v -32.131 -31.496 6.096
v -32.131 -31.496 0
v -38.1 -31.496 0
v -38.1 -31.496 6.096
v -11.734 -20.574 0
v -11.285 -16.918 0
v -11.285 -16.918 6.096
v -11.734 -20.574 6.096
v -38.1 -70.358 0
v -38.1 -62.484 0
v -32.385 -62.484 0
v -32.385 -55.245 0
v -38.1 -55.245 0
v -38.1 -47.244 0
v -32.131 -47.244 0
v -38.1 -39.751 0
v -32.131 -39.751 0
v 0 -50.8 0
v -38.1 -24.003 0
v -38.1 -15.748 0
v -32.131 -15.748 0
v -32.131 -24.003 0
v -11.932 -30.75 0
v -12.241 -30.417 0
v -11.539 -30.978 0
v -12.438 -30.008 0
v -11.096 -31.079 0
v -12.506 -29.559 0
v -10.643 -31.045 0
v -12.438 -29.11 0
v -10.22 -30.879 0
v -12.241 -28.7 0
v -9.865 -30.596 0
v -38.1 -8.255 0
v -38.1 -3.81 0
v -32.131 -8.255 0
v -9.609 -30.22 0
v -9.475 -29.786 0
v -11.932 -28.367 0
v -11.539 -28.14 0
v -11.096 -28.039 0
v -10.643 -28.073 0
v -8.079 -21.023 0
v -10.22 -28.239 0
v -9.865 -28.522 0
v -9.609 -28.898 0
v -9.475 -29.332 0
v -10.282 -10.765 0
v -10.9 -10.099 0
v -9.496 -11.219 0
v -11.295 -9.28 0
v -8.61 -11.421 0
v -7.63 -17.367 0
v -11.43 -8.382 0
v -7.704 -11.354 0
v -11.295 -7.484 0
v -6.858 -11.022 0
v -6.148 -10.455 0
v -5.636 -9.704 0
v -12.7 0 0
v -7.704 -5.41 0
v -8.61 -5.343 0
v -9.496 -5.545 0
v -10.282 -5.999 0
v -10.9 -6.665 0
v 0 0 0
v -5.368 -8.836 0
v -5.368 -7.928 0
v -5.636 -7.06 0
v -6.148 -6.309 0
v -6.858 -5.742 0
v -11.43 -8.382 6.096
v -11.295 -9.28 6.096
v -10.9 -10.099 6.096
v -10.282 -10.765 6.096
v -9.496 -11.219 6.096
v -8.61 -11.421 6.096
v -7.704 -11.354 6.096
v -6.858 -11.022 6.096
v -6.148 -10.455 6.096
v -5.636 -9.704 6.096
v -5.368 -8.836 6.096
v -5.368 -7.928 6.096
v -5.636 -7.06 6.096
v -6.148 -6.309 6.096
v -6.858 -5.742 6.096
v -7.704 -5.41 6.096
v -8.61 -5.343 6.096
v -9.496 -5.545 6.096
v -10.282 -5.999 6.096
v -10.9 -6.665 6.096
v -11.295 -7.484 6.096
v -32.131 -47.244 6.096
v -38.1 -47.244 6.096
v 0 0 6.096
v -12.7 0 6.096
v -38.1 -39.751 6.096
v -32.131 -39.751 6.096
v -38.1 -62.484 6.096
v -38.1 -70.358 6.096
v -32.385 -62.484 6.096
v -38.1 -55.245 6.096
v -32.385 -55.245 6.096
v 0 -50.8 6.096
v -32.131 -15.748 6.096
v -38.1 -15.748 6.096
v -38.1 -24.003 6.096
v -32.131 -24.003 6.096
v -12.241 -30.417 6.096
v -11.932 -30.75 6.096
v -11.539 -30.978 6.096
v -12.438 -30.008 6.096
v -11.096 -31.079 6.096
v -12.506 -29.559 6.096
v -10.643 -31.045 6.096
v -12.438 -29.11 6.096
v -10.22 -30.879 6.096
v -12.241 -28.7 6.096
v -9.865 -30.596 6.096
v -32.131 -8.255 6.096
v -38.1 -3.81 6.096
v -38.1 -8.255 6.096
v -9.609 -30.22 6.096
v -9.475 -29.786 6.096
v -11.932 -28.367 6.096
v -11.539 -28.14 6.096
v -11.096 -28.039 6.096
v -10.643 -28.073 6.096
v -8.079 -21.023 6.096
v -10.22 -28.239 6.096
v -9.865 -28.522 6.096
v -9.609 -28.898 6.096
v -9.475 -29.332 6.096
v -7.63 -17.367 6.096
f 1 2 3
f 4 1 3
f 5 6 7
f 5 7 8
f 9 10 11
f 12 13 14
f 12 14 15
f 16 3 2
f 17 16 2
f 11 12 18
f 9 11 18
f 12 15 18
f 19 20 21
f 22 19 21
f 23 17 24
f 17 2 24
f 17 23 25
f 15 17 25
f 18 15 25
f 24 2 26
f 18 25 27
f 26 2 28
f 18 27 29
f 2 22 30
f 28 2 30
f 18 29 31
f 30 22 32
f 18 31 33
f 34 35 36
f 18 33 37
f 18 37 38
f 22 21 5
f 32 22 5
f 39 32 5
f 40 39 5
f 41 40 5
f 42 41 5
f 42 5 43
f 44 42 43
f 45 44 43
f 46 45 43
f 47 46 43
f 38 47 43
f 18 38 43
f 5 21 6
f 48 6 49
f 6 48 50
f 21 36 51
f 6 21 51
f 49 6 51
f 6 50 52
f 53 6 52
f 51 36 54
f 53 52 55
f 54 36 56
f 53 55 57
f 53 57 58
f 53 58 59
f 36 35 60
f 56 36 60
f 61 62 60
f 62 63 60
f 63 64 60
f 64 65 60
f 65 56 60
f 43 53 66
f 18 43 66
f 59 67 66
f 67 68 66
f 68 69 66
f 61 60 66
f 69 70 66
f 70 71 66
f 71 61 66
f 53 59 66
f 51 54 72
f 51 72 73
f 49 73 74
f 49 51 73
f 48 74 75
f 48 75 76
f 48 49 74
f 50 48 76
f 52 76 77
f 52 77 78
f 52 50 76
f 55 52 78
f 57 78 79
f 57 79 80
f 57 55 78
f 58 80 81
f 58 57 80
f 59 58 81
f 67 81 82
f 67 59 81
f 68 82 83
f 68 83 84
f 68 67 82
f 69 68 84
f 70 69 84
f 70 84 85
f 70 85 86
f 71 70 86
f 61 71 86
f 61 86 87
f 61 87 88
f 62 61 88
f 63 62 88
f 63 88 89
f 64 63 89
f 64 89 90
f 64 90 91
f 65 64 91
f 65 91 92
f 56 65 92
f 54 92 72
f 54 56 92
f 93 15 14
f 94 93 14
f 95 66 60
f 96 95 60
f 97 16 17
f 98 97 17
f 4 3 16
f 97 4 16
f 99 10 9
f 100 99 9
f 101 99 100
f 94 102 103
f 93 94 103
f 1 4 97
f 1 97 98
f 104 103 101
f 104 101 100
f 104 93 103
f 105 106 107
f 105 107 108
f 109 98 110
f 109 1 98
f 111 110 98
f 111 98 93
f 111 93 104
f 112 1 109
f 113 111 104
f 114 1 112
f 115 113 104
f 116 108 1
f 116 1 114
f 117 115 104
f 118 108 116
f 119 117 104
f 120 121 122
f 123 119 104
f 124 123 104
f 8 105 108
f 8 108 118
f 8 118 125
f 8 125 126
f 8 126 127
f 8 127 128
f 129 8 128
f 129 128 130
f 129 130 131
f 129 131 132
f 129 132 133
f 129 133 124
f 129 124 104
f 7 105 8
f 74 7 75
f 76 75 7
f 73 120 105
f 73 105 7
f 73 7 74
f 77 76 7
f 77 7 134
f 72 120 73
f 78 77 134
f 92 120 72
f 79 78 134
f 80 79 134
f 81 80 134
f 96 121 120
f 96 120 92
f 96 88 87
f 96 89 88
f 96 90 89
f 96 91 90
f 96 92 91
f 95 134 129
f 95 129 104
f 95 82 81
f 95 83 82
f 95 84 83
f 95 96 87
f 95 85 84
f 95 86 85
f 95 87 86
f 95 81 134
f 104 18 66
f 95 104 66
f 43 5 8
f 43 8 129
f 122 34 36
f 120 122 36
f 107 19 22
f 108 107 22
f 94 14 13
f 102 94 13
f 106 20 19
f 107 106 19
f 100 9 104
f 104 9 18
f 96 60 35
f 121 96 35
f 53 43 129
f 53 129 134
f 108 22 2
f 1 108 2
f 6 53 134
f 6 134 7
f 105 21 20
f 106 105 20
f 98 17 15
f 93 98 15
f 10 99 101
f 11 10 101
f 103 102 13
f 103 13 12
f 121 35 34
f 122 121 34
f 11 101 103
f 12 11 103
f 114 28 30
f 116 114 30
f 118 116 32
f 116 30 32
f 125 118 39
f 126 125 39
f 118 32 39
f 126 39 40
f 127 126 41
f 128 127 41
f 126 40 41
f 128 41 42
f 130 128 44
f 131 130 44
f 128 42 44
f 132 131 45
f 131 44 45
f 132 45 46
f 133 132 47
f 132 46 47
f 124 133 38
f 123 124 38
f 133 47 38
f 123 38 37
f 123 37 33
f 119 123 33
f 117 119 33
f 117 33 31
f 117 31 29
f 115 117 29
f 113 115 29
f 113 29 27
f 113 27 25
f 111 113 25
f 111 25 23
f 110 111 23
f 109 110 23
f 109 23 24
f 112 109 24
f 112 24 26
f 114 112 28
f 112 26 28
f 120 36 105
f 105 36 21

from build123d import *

# Parameters (mm, degrees)
SKETCH1_R           = 3.048
BOSS_EXTRUDE1_DEPTH = 6.096
CUT_EXTRUDE1_DEPTH  = 8.636
SKETCH4_W           = 5.715
SKETCH4_H           = 7.239
CUT_EXTRUDE2_DEPTH  = 81.243500547
SKETCH5_R           = 1.524
CUT_EXTRUDE4_DEPTH  = 6.096


with BuildPart() as part:
    # Sketch1 → Boss-Extrude1 (new body)
    with BuildSketch(Plane.XY):
        Polygon((0, 0), (-38.1, 0), (-38.1, -8.255), (-32.131, -8.255), (-32.131, -15.748), (-38.1, -15.748), (-38.1, -24.003), (-32.131, -24.003), (-32.131, -31.496), (-38.1, -31.496), (-38.1, -39.751), (-32.131, -39.751), (-32.131, -47.244), (-38.1, -47.244), (-38.1, -70.358), (0, -50.8), align=None)
        with Locations(Location((-8.382, -8.382, 0), (0, 0, 180))):
            Circle(SKETCH1_R, mode=Mode.SUBTRACT)
    extrude(amount=BOSS_EXTRUDE1_DEPTH)

    # Sketch2 → Cut-Extrude1 (cut)
    with BuildSketch(Plane(origin=(0, 0, 0), x_dir=(-1, 0, 0), z_dir=(0, 0, -1))):
        Polygon((38.1, 0), (12.7, 0), (38.1, -3.81), align=None)
    extrude(amount=-CUT_EXTRUDE1_DEPTH, mode=Mode.SUBTRACT)

    # Sketch4 → Cut-Extrude2 (cut, through all)
    with BuildSketch(Plane.XY.offset(6.096)):
        with Locations((-35.2425, -58.8645)):
            Rectangle(SKETCH4_W, SKETCH4_H)
    extrude(amount=-CUT_EXTRUDE2_DEPTH, mode=Mode.SUBTRACT)

    # Sketch5 → Cut-Extrude4 (cut)
    with BuildSketch(Plane(origin=(0, 0, 0), x_dir=(-1, 0, 0), z_dir=(0, 0, -1))):
        with Locations((10.982204311, -29.558964691)):
            Circle(SKETCH5_R)
        Polygon((7.629906021, -17.367131003), (11.285453498, -16.918286212), (11.73429829, -20.573833688), (8.078750813, -21.02267848), align=None)
    extrude(amount=-CUT_EXTRUDE4_DEPTH, mode=Mode.SUBTRACT)


solid = part.part
